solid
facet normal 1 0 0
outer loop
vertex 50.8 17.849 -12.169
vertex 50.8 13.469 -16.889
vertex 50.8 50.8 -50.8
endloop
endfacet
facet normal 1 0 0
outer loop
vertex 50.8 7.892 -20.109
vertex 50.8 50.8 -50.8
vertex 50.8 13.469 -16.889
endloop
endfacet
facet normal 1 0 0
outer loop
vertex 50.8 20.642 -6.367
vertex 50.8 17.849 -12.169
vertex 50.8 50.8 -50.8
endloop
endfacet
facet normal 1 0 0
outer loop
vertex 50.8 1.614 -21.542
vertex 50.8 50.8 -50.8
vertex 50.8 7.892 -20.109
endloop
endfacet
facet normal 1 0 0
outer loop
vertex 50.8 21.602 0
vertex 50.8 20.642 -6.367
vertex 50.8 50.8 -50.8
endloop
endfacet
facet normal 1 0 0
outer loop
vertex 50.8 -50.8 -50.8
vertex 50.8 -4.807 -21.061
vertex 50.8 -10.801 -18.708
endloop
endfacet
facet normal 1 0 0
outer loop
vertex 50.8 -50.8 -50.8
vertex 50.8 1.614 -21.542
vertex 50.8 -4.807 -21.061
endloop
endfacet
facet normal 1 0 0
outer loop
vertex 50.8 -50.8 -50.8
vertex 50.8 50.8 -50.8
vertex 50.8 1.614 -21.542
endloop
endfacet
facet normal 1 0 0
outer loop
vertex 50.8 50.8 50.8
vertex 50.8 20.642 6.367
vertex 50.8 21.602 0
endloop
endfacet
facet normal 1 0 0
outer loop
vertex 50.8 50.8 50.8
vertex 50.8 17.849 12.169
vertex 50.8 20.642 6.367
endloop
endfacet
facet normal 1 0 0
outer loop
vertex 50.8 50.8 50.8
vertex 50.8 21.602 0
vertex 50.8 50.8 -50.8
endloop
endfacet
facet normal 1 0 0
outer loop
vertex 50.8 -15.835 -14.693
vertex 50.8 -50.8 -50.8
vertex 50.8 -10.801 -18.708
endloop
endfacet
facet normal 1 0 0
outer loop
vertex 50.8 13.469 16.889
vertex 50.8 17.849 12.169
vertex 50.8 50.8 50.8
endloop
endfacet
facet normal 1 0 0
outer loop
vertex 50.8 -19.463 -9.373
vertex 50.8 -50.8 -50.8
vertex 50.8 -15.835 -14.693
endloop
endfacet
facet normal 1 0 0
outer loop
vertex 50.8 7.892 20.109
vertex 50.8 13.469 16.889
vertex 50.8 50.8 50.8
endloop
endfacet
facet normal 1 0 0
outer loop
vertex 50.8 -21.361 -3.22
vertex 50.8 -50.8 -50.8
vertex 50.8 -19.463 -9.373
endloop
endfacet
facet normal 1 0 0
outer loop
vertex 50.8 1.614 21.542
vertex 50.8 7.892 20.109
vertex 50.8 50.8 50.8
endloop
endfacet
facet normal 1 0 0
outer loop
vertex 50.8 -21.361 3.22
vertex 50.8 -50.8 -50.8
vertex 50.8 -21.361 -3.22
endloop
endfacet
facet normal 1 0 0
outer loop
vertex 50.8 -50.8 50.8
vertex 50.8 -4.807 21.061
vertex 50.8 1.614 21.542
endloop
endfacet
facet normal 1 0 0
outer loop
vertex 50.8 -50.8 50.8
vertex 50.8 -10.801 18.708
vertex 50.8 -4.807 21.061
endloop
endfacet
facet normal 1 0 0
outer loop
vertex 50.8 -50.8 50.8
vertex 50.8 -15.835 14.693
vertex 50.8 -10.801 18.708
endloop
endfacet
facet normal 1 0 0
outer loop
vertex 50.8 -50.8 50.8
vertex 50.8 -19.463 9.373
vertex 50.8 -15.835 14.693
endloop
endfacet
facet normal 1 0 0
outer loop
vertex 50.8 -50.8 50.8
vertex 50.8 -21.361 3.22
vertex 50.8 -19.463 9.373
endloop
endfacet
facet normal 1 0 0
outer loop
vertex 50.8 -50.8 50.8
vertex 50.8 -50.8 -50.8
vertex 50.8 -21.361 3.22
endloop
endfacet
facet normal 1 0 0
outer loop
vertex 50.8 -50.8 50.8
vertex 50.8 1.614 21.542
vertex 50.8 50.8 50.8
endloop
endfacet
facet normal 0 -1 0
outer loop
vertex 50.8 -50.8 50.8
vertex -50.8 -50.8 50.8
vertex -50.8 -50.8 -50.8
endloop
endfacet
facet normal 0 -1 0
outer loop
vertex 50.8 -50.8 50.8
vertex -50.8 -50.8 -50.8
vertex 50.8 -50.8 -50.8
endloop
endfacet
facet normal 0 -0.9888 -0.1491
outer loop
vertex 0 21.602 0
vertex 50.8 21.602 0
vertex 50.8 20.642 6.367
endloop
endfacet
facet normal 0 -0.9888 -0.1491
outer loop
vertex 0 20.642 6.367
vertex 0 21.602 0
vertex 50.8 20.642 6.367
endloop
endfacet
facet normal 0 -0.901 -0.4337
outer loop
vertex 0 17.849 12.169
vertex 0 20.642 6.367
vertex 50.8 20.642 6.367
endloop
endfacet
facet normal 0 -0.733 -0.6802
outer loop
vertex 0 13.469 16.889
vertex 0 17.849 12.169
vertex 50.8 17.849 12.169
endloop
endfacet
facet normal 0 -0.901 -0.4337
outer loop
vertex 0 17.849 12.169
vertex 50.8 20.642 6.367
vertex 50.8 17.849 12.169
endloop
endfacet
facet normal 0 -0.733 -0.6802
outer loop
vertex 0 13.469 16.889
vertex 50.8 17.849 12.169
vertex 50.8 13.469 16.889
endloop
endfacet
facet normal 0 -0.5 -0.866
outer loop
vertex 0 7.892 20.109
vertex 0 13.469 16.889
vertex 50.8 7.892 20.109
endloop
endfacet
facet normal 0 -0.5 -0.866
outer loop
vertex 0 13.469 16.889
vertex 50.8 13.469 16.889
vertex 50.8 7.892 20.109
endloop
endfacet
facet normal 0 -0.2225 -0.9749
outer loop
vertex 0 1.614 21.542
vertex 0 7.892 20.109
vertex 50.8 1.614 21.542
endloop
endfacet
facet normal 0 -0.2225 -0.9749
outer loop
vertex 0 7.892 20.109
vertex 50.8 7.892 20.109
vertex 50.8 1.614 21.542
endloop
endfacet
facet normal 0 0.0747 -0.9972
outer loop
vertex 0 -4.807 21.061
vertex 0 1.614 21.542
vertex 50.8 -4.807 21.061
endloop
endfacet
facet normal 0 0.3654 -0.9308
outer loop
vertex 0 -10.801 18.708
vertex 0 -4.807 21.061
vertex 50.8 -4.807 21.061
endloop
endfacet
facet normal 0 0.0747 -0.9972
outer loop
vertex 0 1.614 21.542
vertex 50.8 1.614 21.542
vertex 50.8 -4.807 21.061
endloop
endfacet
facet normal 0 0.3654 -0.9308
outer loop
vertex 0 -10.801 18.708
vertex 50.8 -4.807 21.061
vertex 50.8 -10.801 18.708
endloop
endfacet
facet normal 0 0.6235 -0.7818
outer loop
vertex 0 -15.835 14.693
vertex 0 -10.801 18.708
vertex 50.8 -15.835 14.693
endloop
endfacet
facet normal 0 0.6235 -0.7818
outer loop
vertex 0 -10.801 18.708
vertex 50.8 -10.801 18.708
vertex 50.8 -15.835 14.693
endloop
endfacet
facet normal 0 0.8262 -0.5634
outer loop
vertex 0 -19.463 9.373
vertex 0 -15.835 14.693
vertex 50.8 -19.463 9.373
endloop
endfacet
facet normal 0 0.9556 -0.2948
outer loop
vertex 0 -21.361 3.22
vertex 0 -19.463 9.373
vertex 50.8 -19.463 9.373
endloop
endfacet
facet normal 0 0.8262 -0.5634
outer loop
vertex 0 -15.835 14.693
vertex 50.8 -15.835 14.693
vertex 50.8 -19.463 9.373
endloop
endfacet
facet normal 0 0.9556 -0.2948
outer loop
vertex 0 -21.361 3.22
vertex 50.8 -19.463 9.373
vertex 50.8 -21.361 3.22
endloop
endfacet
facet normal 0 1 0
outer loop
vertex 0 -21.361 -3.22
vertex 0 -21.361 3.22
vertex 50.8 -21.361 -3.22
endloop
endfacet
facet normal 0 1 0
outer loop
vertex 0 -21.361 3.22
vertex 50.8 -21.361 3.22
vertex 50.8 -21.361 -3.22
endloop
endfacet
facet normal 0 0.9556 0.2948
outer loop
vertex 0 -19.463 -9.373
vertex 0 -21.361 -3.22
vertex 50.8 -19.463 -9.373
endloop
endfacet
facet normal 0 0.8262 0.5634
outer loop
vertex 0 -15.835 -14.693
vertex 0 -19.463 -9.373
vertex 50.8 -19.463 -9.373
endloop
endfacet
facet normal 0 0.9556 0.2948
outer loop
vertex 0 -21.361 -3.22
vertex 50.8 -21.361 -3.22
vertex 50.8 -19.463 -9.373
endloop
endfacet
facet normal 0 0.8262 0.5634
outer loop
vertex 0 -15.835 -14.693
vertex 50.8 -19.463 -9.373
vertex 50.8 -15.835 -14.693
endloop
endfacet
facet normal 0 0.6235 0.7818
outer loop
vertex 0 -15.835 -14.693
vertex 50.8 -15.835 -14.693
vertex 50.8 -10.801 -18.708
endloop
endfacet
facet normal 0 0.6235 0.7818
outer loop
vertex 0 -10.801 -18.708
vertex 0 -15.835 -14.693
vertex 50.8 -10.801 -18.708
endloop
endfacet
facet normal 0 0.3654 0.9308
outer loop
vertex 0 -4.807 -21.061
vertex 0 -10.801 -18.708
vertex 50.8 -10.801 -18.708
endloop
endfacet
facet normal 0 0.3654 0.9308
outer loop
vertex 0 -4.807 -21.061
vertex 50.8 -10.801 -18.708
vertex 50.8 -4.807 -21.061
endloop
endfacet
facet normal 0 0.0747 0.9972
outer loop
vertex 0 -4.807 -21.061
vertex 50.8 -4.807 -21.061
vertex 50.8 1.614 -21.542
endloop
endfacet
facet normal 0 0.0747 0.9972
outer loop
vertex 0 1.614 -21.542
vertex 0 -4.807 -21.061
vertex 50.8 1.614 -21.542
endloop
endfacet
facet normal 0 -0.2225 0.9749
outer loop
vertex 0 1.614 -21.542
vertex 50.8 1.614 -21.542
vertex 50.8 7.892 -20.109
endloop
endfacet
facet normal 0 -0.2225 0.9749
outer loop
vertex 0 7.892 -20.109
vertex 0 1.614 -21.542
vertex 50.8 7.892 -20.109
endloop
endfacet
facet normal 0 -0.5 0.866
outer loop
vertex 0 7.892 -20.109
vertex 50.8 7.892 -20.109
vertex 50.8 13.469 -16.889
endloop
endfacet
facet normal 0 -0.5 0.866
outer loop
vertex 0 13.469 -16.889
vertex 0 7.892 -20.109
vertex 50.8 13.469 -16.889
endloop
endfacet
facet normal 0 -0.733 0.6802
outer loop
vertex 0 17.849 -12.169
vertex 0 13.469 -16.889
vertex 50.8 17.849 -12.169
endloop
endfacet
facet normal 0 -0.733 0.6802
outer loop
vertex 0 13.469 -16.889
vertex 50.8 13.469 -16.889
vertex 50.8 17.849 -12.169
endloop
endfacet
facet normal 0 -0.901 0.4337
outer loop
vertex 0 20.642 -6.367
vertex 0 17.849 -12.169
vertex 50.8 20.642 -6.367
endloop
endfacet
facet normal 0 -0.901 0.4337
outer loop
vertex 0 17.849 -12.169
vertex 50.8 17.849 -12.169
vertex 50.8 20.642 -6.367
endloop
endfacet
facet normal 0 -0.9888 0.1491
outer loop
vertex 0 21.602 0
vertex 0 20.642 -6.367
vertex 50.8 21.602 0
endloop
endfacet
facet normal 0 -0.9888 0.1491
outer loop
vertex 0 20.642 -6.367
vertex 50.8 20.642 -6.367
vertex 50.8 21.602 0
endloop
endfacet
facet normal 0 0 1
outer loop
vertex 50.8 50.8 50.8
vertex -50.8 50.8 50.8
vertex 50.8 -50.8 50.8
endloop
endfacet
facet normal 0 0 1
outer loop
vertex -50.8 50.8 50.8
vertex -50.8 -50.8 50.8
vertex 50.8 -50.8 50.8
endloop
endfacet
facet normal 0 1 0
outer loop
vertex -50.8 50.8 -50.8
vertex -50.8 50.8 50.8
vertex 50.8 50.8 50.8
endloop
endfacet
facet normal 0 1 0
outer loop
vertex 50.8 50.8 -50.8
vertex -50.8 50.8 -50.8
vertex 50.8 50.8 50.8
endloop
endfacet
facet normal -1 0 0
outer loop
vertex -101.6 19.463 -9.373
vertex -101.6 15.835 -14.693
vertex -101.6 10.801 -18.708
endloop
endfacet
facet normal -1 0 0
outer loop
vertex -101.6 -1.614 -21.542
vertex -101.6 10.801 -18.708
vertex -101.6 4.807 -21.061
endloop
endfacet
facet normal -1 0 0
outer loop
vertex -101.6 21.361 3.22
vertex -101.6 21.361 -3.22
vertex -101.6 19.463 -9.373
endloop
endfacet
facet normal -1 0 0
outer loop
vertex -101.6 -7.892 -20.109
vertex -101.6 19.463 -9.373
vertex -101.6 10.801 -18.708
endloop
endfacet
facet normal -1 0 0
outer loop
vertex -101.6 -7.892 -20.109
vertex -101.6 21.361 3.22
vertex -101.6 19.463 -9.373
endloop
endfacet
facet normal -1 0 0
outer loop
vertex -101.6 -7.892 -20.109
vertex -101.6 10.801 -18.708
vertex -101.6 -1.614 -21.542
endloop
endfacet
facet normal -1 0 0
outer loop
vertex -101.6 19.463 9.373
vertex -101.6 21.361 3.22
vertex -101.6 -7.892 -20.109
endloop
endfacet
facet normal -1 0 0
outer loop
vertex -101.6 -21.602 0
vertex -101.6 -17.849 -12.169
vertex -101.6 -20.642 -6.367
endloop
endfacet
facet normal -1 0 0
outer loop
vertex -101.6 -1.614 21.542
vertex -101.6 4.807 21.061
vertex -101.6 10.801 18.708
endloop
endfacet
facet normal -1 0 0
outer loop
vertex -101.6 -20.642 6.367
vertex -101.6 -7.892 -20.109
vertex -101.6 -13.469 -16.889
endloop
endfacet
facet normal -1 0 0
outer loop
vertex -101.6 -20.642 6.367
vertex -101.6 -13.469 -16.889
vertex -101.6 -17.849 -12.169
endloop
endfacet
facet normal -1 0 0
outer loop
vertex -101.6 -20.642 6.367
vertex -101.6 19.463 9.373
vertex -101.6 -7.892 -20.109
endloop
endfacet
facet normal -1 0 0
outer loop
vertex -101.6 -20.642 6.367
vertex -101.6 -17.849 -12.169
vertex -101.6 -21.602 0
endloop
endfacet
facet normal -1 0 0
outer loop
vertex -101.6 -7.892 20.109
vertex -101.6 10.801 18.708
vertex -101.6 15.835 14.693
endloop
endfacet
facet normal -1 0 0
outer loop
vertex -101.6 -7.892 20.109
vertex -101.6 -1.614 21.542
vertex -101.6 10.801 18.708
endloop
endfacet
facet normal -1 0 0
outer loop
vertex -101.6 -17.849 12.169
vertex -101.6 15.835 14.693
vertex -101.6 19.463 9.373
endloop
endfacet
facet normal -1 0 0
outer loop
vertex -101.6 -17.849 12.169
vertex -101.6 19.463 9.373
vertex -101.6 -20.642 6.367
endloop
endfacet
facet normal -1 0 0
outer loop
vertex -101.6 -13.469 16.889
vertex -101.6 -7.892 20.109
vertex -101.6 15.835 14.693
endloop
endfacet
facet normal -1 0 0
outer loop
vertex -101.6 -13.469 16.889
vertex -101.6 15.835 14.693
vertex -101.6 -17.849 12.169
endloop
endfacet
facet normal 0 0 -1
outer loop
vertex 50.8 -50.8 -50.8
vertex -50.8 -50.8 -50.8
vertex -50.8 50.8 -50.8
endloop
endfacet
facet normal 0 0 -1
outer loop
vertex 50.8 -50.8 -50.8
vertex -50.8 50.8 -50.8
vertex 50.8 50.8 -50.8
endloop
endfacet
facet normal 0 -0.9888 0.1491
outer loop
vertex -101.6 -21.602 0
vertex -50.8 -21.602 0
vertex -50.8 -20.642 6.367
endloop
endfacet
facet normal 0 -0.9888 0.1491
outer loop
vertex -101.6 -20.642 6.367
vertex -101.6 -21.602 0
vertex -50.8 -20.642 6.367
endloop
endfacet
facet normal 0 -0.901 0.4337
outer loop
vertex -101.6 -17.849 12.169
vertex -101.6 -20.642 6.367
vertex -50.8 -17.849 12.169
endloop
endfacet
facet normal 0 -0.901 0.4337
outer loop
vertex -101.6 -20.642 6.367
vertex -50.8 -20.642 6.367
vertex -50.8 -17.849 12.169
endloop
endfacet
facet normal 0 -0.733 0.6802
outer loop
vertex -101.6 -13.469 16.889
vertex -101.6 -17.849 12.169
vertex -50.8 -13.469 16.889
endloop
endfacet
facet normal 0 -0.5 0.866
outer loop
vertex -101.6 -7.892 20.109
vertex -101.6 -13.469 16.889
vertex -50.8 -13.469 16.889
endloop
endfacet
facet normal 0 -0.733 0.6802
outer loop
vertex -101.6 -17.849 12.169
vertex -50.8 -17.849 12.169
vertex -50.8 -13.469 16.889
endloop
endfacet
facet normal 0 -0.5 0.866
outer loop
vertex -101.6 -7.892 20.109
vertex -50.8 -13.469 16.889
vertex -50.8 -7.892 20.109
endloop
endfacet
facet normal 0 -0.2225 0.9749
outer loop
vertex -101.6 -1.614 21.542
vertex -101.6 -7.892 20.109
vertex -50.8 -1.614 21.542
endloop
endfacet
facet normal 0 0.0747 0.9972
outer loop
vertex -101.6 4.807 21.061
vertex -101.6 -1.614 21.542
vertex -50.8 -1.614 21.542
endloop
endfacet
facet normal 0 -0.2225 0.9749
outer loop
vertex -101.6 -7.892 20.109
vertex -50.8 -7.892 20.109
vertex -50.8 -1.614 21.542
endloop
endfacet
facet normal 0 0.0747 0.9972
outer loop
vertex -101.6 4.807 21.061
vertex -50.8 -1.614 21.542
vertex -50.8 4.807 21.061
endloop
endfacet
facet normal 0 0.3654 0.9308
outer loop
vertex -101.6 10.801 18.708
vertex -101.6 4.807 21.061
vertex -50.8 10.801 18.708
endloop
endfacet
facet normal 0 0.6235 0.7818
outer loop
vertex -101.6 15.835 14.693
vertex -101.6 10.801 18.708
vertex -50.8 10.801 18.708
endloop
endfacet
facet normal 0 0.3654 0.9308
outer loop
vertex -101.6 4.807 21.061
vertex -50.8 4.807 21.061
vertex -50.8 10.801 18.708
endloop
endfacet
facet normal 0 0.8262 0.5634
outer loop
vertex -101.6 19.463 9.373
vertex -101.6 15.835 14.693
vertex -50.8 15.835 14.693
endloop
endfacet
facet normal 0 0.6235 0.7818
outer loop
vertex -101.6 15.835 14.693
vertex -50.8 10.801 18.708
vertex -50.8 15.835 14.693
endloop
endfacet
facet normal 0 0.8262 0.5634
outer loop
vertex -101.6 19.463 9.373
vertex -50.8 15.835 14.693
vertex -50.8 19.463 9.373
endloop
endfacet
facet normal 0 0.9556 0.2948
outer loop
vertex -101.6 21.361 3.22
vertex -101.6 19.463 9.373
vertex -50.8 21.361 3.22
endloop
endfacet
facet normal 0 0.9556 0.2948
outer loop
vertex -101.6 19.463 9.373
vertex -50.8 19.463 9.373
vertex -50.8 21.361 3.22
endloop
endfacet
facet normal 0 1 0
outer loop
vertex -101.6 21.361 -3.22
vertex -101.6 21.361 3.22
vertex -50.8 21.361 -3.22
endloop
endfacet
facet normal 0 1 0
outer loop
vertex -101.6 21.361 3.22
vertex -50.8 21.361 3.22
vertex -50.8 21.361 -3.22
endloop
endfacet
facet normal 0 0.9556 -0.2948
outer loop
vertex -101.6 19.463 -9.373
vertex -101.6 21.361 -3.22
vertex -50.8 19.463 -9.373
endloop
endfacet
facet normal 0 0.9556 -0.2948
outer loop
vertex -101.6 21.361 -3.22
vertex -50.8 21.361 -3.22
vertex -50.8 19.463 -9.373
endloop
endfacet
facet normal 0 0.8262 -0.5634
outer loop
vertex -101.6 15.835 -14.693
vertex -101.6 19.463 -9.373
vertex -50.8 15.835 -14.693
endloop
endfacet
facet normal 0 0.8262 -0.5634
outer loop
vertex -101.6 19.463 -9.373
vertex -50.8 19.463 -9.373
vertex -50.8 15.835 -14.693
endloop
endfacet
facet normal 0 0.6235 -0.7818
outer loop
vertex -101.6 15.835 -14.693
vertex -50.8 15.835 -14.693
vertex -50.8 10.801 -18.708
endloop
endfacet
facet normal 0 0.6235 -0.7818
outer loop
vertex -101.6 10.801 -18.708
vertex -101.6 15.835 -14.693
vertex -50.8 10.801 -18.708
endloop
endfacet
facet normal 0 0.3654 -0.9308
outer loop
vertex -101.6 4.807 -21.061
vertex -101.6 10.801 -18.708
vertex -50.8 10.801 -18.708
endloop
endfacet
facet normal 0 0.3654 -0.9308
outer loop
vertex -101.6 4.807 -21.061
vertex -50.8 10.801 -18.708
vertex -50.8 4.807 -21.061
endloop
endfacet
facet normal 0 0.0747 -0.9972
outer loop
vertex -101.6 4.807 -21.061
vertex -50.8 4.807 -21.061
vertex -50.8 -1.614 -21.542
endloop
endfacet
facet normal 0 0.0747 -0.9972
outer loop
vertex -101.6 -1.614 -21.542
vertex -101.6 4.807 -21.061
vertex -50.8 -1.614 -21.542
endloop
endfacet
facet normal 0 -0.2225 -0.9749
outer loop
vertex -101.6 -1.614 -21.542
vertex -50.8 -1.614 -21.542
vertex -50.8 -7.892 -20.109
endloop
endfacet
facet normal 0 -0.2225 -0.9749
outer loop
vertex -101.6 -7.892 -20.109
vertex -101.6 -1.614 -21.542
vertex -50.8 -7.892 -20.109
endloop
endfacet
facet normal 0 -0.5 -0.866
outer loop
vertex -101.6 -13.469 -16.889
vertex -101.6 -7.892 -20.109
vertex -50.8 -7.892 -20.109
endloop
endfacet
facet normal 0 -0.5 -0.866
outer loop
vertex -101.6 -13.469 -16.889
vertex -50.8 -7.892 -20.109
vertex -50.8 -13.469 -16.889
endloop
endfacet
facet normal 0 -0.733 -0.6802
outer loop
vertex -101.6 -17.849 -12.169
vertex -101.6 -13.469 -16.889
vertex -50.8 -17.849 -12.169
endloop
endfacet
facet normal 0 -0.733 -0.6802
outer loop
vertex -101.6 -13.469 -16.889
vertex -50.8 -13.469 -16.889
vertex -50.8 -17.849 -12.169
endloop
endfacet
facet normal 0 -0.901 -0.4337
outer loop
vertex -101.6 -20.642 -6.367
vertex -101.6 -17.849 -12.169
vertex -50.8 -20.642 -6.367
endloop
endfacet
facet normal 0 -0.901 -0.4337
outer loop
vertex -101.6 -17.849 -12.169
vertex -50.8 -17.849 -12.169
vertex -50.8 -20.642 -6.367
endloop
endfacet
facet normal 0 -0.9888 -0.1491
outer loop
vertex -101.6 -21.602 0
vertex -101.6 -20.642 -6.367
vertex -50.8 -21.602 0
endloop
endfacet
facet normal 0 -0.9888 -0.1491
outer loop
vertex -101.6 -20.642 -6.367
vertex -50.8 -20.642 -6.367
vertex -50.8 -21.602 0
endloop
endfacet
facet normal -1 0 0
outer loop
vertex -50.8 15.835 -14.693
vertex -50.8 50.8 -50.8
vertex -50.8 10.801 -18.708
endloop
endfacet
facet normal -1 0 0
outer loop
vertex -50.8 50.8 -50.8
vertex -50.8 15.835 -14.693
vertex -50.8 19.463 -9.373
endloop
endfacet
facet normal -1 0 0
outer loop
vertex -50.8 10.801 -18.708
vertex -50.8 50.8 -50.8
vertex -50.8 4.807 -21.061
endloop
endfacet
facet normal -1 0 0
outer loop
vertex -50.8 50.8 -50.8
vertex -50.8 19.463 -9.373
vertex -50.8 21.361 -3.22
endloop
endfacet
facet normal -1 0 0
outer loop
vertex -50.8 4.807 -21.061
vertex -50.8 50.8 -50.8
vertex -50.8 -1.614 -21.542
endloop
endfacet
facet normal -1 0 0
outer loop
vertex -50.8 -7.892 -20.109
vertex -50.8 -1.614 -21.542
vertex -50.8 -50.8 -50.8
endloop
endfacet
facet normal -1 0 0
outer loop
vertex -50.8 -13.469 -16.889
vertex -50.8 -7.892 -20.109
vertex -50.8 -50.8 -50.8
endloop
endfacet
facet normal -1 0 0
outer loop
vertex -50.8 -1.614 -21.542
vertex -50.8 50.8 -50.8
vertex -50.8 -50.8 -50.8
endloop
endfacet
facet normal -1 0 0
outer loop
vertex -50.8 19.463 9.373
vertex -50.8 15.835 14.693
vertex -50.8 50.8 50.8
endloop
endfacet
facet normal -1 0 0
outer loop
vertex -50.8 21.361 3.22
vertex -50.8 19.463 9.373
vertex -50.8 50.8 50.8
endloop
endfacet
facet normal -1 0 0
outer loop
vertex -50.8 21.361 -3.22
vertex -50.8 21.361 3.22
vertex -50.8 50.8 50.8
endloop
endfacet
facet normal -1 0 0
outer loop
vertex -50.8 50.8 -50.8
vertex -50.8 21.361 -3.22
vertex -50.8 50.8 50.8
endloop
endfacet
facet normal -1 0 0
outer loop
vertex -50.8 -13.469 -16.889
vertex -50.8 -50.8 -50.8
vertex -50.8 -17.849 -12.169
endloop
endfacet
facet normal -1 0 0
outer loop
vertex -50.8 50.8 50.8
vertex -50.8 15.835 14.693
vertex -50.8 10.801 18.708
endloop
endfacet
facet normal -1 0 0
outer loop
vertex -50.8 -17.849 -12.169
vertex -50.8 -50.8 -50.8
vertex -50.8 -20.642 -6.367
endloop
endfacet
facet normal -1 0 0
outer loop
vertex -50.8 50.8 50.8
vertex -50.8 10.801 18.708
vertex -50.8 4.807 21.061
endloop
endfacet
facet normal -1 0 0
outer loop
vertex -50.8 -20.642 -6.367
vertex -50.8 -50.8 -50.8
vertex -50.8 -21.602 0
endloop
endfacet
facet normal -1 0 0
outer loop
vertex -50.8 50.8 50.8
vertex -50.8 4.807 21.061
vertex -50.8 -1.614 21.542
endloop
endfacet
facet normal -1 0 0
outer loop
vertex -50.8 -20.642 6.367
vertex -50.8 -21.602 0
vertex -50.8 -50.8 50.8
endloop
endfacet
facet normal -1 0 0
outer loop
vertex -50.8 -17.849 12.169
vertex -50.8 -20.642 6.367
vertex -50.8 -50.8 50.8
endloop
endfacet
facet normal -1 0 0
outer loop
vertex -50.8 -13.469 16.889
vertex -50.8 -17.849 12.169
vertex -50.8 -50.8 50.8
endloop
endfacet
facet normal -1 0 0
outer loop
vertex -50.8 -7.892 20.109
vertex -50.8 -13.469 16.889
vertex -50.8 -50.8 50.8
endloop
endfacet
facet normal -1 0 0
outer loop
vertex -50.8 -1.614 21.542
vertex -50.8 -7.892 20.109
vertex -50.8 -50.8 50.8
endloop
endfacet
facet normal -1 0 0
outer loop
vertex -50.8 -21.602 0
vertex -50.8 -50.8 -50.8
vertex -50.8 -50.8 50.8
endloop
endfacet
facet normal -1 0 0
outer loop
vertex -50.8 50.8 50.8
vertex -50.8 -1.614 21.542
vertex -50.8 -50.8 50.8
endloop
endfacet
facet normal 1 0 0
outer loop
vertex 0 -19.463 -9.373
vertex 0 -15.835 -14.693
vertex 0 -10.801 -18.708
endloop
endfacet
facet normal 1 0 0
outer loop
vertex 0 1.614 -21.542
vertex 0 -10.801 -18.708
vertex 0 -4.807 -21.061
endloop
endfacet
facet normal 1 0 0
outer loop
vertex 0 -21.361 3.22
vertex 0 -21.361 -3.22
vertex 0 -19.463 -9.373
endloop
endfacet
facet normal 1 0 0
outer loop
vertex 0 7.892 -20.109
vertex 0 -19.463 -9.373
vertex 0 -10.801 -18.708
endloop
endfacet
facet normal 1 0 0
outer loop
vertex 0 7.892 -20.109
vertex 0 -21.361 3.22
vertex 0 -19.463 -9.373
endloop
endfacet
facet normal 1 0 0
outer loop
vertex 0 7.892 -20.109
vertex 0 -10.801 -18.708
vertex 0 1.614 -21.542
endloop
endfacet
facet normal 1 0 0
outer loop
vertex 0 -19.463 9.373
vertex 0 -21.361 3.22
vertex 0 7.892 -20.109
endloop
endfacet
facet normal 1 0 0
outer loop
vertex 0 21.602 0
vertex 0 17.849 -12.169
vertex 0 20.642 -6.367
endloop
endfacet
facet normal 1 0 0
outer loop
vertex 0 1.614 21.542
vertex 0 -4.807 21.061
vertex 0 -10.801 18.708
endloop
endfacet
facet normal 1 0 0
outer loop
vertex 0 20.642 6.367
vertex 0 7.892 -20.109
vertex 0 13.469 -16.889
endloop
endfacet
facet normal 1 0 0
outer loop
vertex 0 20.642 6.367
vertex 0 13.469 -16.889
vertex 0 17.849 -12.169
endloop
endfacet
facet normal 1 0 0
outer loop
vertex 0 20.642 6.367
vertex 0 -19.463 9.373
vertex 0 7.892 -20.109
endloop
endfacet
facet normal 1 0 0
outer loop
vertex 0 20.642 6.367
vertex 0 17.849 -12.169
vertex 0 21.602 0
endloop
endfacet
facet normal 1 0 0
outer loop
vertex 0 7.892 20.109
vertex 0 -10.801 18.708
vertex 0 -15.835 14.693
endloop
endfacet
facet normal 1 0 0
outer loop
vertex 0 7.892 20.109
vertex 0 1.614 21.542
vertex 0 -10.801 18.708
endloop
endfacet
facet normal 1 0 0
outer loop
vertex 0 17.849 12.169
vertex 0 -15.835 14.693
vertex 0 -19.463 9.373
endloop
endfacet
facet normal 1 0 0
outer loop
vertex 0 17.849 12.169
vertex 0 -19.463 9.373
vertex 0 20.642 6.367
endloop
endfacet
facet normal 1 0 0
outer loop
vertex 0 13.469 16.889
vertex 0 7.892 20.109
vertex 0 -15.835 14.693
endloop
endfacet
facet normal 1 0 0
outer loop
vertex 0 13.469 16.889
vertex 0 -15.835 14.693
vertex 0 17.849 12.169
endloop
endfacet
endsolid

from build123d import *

# Parameters (mm, degrees)
F1_W     = 101.6
F1_H     = 101.6
F2_DEPTH = 50.8
F3_R     = 21.6021439773
F4_DEPTH = 50.8
F5_R     = 21.6021439773
F6_DEPTH = 50.8


# Not quite as in the source:
# - a variable given as a bare number and used for a length is read in inches; the dataset says mm whatever the document's units were


with BuildPart() as f2:
    # F1 (on Front) → F2 (new body, symmetric)
    with BuildSketch(Plane.XZ):
        Rectangle(F1_W, F1_H)
    extrude(amount=F2_DEPTH, both=True)

    # F3 (on face) → F4 (cut)
    with BuildSketch(Plane.YZ.offset(50.8)):
        Circle(F3_R)
    extrude(amount=-F4_DEPTH, mode=Mode.SUBTRACT)

    # F5 (on face) → F6 (join)
    with BuildSketch(Plane(origin=(-50.8, 0, 0), x_dir=(0, -1, 0), z_dir=(-1, 0, 0))):
        Circle(F5_R)
    extrude(amount=F6_DEPTH)


solid = f2.part
